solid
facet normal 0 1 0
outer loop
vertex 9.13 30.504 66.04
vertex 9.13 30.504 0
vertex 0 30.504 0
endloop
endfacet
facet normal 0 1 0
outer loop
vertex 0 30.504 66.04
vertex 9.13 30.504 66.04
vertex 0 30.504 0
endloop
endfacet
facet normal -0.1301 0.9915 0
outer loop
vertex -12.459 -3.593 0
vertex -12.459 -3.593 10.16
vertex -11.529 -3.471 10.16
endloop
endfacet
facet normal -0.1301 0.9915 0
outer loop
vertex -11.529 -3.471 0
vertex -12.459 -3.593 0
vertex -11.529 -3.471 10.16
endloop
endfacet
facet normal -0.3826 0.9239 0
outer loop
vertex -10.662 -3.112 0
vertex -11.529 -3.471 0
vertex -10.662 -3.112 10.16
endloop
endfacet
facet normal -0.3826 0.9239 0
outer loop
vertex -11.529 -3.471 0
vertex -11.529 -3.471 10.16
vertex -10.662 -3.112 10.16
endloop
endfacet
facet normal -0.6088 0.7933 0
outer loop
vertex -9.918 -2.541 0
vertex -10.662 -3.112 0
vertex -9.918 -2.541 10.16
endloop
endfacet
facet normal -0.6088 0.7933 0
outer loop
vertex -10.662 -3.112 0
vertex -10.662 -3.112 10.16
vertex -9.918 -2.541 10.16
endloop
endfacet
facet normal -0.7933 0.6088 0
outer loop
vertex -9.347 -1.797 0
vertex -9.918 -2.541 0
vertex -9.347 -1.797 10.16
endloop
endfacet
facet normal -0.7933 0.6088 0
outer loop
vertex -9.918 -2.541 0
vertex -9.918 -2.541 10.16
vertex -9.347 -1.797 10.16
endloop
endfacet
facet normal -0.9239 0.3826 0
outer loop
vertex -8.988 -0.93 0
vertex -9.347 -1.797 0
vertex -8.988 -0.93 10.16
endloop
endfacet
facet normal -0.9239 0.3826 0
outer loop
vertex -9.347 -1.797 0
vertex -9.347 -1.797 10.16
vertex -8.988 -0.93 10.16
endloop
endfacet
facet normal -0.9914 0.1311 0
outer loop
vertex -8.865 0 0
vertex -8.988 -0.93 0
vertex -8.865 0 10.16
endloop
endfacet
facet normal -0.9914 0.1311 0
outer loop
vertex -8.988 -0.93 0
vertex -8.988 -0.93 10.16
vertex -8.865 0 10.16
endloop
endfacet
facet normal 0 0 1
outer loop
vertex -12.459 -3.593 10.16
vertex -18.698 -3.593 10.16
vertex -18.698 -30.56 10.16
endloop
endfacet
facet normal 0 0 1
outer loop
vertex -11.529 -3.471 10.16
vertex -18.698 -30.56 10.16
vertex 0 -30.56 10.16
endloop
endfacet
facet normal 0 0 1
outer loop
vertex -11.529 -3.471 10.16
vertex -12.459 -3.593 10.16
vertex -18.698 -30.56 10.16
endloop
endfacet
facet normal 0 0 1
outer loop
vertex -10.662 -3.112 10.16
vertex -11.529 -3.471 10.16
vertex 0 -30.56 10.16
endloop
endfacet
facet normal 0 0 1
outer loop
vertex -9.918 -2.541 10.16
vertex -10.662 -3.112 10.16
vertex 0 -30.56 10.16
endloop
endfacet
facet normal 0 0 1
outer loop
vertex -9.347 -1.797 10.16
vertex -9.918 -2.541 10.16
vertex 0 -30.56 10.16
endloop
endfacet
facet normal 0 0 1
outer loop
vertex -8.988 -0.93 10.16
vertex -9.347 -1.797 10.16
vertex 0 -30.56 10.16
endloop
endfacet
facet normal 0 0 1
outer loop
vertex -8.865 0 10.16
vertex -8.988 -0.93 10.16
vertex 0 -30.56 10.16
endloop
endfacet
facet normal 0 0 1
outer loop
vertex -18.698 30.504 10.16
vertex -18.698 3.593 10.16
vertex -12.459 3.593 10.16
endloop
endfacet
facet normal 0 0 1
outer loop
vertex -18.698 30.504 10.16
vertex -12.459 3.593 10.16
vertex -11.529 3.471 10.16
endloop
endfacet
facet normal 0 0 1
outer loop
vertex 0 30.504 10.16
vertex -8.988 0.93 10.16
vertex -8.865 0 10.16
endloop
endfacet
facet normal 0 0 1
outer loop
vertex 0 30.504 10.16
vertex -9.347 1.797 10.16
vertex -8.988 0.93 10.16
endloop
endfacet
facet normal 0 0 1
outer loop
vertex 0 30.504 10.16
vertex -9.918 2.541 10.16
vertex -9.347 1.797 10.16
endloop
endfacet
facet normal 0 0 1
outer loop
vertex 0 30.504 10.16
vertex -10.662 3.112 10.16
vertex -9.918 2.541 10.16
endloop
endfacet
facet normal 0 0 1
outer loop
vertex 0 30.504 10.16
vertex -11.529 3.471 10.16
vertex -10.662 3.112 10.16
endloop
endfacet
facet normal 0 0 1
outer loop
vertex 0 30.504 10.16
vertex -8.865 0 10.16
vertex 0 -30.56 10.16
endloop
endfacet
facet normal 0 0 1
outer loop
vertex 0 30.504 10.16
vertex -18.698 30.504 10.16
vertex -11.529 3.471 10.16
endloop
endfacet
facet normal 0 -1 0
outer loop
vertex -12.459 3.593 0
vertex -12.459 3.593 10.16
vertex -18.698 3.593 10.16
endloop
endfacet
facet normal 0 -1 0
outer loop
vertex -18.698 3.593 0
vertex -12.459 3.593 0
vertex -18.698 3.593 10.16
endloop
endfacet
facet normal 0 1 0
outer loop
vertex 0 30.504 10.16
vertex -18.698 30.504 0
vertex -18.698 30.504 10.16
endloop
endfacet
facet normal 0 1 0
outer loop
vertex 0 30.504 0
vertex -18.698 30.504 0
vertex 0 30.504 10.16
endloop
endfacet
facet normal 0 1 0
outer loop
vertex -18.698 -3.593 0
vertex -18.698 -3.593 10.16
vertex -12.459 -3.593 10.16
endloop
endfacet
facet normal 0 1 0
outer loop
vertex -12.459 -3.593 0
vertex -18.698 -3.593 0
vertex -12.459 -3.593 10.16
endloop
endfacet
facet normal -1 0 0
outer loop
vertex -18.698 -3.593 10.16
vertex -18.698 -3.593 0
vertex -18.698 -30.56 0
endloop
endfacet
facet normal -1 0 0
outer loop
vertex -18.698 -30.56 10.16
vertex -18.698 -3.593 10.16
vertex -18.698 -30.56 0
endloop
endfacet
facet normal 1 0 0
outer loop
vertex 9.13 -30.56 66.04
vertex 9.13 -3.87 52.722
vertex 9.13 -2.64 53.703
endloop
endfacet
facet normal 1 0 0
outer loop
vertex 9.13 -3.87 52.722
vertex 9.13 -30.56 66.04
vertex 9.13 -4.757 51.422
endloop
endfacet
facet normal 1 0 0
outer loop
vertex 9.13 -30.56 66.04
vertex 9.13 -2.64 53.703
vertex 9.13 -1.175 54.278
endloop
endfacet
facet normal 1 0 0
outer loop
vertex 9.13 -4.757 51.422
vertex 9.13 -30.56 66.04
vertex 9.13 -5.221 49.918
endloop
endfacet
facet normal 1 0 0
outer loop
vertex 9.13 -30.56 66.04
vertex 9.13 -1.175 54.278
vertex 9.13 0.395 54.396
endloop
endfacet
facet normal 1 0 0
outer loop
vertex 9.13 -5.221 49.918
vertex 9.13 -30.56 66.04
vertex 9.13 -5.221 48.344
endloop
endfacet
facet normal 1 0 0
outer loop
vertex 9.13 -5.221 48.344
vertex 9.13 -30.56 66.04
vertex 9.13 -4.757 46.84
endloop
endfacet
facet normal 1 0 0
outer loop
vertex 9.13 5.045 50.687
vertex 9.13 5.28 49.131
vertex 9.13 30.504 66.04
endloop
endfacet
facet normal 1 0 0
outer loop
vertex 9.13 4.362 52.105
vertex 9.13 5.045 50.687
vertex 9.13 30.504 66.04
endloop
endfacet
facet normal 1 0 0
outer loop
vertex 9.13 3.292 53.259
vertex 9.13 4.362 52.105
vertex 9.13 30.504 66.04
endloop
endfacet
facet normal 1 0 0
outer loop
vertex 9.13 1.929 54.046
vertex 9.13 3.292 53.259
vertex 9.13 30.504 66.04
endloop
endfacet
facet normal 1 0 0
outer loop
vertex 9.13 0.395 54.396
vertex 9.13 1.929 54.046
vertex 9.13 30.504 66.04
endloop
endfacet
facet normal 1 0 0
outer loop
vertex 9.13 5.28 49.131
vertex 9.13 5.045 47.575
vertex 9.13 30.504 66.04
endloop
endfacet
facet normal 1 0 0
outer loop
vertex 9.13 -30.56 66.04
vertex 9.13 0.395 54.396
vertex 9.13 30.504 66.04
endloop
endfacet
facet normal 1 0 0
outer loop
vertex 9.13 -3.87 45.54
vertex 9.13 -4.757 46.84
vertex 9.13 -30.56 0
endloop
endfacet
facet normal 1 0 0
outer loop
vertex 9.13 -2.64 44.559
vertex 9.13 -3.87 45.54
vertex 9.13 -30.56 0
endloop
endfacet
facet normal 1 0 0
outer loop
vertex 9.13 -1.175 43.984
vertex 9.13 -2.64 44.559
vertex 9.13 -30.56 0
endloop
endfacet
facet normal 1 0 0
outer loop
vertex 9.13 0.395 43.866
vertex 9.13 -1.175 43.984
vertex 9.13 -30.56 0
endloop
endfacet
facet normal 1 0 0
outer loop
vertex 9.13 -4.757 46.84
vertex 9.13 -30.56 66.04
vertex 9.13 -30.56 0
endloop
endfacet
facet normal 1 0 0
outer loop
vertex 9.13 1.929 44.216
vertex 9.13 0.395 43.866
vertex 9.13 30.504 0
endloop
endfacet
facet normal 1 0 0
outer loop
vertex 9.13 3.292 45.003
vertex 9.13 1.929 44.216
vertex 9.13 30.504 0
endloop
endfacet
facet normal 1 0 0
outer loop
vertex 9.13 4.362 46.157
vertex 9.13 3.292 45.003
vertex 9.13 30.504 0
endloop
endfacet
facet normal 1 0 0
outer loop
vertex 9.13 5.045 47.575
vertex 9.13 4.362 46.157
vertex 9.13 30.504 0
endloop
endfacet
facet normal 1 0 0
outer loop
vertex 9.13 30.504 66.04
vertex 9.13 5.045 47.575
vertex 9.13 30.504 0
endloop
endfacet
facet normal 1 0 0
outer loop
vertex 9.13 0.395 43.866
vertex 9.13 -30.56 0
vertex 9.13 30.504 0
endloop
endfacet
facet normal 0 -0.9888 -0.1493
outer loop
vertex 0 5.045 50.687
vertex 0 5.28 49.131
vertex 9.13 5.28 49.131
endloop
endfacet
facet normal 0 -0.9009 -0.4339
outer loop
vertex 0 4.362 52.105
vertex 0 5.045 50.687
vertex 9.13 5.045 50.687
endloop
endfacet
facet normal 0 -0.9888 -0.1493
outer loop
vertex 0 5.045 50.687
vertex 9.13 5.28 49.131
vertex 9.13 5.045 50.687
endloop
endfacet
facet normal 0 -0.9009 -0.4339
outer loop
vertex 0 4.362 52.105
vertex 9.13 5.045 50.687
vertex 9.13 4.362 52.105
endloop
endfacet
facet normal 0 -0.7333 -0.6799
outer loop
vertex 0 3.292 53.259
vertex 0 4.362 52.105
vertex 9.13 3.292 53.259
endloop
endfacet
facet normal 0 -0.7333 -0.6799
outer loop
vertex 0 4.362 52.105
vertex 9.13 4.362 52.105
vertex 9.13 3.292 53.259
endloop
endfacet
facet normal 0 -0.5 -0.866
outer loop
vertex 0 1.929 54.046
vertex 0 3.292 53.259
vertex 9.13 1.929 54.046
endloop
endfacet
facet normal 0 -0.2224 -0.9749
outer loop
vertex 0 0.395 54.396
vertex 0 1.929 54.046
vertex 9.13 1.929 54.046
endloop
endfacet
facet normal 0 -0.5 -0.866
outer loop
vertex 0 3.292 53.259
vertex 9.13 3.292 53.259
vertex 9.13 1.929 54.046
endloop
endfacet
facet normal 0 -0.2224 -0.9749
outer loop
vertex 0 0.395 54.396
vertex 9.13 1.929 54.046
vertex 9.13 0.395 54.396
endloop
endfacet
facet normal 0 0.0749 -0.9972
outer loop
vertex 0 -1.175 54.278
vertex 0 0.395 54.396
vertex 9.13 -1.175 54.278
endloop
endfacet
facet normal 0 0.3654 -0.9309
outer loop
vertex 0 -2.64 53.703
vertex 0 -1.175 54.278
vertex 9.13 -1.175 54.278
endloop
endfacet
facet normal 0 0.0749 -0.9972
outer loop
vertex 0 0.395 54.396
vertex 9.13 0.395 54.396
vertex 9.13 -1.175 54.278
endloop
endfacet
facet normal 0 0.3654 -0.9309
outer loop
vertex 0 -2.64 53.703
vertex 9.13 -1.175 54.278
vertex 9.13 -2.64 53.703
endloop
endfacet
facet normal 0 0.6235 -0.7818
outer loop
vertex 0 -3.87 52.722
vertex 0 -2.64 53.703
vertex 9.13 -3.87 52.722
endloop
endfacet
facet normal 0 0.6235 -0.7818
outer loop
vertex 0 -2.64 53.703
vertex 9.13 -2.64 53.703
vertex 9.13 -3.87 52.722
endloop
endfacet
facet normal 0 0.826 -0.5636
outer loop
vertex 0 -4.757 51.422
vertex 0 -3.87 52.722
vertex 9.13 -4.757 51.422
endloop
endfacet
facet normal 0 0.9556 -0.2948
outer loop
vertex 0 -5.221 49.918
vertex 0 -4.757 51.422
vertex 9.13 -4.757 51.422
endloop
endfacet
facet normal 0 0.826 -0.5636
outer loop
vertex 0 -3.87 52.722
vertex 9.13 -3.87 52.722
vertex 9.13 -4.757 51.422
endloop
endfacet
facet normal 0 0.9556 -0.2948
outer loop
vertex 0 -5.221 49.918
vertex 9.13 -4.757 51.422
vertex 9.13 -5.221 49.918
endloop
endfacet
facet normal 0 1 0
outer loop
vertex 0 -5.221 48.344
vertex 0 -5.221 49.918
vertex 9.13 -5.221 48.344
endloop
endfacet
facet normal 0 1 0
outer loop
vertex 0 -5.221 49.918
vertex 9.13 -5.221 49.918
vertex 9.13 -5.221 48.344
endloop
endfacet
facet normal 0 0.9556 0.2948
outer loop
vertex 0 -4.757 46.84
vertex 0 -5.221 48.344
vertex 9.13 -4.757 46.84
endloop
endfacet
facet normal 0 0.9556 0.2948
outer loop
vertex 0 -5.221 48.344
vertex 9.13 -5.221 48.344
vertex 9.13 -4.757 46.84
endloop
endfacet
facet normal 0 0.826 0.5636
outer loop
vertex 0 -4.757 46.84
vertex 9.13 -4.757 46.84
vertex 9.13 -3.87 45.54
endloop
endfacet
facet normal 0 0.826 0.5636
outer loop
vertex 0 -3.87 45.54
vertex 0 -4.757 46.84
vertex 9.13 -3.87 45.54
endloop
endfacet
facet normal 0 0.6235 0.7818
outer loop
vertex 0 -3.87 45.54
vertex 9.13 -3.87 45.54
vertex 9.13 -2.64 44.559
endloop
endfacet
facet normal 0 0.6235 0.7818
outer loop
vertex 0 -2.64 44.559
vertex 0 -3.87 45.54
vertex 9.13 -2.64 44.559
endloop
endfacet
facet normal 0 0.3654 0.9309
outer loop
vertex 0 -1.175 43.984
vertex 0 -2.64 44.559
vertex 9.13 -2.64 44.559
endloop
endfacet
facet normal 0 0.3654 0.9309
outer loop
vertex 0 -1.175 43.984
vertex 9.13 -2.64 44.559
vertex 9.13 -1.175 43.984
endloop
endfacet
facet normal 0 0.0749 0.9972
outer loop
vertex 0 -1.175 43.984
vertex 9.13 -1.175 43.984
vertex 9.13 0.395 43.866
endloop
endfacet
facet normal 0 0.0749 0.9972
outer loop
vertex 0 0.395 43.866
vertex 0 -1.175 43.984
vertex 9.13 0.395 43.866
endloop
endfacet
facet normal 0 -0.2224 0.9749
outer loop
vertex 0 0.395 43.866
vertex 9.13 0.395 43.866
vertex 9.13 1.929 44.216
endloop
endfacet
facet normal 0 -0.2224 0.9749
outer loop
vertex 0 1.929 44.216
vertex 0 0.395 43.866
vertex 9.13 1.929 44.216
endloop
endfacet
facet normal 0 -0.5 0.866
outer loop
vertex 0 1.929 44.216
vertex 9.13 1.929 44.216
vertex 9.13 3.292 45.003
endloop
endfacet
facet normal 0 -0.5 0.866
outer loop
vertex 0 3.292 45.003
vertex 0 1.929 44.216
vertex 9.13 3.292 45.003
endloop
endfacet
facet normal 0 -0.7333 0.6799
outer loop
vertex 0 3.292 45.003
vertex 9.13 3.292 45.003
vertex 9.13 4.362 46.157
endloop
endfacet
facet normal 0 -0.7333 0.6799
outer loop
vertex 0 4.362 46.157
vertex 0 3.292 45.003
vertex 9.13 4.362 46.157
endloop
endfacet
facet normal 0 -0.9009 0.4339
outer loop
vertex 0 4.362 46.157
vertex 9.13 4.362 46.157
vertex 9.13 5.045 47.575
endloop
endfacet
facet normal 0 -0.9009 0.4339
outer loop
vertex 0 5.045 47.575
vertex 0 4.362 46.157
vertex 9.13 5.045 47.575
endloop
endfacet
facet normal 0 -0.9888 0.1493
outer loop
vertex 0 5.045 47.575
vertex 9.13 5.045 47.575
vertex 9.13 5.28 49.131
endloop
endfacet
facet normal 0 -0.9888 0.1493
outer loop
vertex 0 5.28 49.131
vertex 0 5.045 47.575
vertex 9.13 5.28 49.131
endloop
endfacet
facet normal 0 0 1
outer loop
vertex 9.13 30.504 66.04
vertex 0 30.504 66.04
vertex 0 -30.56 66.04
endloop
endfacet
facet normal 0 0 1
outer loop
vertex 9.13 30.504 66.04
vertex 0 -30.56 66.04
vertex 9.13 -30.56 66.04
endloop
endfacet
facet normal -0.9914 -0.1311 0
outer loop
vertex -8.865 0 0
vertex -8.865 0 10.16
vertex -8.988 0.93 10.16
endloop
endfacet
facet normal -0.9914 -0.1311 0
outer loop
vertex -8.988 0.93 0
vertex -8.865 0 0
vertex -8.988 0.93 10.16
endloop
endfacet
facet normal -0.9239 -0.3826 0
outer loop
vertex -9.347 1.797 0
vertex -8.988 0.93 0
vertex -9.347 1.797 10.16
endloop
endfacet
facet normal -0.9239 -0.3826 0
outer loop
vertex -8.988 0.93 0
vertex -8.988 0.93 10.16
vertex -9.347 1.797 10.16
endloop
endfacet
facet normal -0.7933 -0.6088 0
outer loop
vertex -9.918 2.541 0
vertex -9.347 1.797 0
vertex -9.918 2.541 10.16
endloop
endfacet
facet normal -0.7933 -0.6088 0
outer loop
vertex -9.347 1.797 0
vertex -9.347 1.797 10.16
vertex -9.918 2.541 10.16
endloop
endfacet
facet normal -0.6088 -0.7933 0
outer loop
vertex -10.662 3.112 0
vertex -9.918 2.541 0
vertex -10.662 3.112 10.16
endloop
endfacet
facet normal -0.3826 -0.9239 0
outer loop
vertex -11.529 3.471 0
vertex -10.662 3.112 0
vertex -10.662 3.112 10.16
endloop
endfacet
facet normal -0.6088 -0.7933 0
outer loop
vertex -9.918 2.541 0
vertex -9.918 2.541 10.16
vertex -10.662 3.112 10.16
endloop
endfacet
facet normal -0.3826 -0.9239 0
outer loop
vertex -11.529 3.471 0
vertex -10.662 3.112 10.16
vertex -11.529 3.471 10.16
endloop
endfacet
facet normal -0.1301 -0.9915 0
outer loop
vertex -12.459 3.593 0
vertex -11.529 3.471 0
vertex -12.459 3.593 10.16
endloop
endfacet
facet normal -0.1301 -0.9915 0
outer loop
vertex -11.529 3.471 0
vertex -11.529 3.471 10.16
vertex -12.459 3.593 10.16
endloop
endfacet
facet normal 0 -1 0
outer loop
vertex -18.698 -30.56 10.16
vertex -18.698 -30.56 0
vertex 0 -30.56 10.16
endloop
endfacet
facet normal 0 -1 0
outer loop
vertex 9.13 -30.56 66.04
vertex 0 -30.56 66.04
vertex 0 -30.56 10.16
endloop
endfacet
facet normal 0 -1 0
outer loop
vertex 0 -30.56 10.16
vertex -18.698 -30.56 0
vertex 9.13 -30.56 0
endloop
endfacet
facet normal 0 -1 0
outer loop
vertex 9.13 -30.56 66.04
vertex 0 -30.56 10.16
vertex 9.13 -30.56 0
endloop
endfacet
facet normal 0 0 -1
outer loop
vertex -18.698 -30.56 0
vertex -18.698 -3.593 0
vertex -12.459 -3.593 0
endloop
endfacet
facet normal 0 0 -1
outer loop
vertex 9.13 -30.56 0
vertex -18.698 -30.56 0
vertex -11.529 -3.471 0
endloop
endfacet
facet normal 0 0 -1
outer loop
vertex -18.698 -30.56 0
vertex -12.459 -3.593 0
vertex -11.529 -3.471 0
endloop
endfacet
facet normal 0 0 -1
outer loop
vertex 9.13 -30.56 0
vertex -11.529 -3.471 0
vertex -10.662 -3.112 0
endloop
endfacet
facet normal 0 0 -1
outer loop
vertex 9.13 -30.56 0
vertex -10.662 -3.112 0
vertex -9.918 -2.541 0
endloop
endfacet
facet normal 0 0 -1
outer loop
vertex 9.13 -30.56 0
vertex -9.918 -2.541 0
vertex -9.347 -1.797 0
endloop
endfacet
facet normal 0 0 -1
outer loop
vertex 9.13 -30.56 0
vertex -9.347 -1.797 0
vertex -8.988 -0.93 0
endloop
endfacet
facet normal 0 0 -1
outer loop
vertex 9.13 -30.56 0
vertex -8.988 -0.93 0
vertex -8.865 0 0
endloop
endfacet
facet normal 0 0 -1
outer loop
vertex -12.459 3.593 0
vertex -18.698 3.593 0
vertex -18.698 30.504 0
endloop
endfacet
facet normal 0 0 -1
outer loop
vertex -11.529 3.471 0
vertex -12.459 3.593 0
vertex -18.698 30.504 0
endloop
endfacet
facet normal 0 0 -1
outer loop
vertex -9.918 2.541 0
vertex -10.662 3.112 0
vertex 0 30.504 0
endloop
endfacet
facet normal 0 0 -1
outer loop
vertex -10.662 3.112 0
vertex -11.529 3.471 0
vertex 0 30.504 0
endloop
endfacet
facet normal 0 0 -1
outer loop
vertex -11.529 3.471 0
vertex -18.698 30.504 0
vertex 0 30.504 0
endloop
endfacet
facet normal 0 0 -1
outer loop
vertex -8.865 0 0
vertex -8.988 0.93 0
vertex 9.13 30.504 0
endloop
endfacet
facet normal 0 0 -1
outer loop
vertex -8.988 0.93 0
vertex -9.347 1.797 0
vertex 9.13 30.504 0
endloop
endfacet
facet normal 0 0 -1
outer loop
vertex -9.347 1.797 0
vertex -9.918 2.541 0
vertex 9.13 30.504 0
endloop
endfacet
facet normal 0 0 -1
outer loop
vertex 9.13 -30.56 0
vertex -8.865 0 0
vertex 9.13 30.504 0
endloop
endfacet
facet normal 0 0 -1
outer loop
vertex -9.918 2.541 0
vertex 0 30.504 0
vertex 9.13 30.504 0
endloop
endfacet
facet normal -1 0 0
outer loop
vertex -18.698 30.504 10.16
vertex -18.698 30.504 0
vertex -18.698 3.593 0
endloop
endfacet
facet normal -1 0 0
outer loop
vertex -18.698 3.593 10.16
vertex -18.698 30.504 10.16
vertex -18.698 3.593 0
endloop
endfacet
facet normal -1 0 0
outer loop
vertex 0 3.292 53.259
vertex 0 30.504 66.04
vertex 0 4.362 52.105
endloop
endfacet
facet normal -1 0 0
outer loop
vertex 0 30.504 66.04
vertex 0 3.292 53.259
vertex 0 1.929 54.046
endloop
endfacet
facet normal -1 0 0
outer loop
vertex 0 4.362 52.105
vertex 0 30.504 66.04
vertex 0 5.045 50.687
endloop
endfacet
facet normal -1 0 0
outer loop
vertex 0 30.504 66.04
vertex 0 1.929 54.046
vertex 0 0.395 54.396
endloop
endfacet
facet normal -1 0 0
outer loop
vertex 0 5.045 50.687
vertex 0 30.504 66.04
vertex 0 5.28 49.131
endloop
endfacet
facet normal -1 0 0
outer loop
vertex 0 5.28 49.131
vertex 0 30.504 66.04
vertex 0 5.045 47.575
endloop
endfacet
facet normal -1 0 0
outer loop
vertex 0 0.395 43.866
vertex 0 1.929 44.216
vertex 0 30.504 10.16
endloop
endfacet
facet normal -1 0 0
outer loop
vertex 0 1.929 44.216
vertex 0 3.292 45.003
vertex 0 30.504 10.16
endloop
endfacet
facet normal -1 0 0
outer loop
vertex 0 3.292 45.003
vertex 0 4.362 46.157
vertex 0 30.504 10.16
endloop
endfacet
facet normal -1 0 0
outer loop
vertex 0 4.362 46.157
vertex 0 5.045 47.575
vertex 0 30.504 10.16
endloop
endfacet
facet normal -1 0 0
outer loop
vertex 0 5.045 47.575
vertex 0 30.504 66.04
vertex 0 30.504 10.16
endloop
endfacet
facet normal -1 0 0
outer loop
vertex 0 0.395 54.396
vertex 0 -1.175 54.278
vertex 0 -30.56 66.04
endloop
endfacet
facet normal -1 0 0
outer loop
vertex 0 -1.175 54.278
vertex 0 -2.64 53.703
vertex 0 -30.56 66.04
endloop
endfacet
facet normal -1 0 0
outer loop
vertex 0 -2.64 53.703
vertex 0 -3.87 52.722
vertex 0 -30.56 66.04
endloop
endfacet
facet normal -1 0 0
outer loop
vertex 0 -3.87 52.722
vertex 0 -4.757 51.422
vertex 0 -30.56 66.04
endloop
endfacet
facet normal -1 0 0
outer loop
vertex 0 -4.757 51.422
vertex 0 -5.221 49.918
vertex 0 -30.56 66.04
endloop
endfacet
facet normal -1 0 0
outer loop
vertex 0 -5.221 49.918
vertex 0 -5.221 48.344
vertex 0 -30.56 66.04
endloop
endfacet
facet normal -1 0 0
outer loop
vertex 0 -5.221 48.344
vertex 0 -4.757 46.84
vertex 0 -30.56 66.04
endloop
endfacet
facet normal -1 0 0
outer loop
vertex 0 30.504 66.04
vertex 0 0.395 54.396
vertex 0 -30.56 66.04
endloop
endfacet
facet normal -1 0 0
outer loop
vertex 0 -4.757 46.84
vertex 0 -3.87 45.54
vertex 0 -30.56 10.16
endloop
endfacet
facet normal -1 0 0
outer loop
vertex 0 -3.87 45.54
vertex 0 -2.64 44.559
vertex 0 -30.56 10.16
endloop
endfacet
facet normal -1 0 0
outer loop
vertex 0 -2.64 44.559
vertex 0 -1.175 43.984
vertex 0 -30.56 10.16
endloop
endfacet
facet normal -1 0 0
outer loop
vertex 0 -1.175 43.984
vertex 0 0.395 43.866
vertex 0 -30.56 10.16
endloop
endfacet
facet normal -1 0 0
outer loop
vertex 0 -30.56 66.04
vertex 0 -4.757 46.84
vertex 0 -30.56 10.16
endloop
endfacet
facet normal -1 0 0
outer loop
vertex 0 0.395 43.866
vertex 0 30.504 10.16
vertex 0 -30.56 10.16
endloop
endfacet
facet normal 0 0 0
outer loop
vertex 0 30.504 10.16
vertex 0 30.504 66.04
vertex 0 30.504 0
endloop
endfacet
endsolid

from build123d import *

# Parameters (mm, degrees)
F1_DEPTH = 66.04
F0_W     = 18.697526
F0_H     = 30.504273
F0_H_2   = 30.559674
F2_DEPTH = 10.16
F3_R     = 5.279602
F4_DEPTH = 25.4
F6_DEPTH = 25.4


with BuildPart() as f1:
    # F0 (on Top) → F1 (new body)
    with BuildSketch(Plane.XY):
        Polygon((0, 30.504273), (0, 0), (0, -30.559674), (9.12961, -30.559674), (9.12961, 30.504273), align=None)
    extrude(amount=F1_DEPTH)

    # F0 (on Top) → F2 (join)
    with BuildSketch(Plane.XY):
        with Locations((-9.348763, 15.252136)):
            Rectangle(F0_W, F0_H)
        with Locations((-9.348763, -15.279837)):
            Rectangle(F0_W, F0_H_2)
    extrude(amount=F2_DEPTH)

    # F3 (on face) → F4 (cut)
    with BuildSketch(Plane.YZ.offset(9.12961)):
        with Locations((0, 49.131077)):
            Circle(F3_R)
    extrude(amount=-F4_DEPTH, mode=Mode.SUBTRACT)

    # F5 (on face) → F6 (cut)
    with BuildSketch(Plane.XY.offset(10.16)):
        with BuildLine():
            ThreePointArc((-12.458752, -3.593451), (-9.917798, -2.540954), (-8.8653, 0))
            ThreePointArc((-8.8653, 0), (-9.917798, 2.540954), (-12.458752, 3.593451))
            Line((-12.458752, 3.593451), (-12.458752, 0))
            Line((-12.458752, 0), (-12.458752, -3.593451))
        make_face()
        with BuildLine():
            Line((-12.458752, 0), (-12.458752, 3.593451))
            ThreePointArc((-12.458752, 3.593451), (-16.052203, 0), (-12.458752, -3.593451))
            Line((-12.458752, -3.593451), (-12.458752, 0))
        make_face()
        with BuildLine():
            ThreePointArc((-12.458752, -3.593451), (-16.052203, 0), (-12.458752, 3.593451))
            Line((-12.458752, 3.593451), (-18.697526, 3.593451))
            Line((-18.697526, 3.593451), (-18.697526, -3.593451))
            Line((-18.697526, -3.593451), (-12.458752, -3.593451))
        make_face()
    extrude(amount=-F6_DEPTH, mode=Mode.SUBTRACT)


solid = f1.part
